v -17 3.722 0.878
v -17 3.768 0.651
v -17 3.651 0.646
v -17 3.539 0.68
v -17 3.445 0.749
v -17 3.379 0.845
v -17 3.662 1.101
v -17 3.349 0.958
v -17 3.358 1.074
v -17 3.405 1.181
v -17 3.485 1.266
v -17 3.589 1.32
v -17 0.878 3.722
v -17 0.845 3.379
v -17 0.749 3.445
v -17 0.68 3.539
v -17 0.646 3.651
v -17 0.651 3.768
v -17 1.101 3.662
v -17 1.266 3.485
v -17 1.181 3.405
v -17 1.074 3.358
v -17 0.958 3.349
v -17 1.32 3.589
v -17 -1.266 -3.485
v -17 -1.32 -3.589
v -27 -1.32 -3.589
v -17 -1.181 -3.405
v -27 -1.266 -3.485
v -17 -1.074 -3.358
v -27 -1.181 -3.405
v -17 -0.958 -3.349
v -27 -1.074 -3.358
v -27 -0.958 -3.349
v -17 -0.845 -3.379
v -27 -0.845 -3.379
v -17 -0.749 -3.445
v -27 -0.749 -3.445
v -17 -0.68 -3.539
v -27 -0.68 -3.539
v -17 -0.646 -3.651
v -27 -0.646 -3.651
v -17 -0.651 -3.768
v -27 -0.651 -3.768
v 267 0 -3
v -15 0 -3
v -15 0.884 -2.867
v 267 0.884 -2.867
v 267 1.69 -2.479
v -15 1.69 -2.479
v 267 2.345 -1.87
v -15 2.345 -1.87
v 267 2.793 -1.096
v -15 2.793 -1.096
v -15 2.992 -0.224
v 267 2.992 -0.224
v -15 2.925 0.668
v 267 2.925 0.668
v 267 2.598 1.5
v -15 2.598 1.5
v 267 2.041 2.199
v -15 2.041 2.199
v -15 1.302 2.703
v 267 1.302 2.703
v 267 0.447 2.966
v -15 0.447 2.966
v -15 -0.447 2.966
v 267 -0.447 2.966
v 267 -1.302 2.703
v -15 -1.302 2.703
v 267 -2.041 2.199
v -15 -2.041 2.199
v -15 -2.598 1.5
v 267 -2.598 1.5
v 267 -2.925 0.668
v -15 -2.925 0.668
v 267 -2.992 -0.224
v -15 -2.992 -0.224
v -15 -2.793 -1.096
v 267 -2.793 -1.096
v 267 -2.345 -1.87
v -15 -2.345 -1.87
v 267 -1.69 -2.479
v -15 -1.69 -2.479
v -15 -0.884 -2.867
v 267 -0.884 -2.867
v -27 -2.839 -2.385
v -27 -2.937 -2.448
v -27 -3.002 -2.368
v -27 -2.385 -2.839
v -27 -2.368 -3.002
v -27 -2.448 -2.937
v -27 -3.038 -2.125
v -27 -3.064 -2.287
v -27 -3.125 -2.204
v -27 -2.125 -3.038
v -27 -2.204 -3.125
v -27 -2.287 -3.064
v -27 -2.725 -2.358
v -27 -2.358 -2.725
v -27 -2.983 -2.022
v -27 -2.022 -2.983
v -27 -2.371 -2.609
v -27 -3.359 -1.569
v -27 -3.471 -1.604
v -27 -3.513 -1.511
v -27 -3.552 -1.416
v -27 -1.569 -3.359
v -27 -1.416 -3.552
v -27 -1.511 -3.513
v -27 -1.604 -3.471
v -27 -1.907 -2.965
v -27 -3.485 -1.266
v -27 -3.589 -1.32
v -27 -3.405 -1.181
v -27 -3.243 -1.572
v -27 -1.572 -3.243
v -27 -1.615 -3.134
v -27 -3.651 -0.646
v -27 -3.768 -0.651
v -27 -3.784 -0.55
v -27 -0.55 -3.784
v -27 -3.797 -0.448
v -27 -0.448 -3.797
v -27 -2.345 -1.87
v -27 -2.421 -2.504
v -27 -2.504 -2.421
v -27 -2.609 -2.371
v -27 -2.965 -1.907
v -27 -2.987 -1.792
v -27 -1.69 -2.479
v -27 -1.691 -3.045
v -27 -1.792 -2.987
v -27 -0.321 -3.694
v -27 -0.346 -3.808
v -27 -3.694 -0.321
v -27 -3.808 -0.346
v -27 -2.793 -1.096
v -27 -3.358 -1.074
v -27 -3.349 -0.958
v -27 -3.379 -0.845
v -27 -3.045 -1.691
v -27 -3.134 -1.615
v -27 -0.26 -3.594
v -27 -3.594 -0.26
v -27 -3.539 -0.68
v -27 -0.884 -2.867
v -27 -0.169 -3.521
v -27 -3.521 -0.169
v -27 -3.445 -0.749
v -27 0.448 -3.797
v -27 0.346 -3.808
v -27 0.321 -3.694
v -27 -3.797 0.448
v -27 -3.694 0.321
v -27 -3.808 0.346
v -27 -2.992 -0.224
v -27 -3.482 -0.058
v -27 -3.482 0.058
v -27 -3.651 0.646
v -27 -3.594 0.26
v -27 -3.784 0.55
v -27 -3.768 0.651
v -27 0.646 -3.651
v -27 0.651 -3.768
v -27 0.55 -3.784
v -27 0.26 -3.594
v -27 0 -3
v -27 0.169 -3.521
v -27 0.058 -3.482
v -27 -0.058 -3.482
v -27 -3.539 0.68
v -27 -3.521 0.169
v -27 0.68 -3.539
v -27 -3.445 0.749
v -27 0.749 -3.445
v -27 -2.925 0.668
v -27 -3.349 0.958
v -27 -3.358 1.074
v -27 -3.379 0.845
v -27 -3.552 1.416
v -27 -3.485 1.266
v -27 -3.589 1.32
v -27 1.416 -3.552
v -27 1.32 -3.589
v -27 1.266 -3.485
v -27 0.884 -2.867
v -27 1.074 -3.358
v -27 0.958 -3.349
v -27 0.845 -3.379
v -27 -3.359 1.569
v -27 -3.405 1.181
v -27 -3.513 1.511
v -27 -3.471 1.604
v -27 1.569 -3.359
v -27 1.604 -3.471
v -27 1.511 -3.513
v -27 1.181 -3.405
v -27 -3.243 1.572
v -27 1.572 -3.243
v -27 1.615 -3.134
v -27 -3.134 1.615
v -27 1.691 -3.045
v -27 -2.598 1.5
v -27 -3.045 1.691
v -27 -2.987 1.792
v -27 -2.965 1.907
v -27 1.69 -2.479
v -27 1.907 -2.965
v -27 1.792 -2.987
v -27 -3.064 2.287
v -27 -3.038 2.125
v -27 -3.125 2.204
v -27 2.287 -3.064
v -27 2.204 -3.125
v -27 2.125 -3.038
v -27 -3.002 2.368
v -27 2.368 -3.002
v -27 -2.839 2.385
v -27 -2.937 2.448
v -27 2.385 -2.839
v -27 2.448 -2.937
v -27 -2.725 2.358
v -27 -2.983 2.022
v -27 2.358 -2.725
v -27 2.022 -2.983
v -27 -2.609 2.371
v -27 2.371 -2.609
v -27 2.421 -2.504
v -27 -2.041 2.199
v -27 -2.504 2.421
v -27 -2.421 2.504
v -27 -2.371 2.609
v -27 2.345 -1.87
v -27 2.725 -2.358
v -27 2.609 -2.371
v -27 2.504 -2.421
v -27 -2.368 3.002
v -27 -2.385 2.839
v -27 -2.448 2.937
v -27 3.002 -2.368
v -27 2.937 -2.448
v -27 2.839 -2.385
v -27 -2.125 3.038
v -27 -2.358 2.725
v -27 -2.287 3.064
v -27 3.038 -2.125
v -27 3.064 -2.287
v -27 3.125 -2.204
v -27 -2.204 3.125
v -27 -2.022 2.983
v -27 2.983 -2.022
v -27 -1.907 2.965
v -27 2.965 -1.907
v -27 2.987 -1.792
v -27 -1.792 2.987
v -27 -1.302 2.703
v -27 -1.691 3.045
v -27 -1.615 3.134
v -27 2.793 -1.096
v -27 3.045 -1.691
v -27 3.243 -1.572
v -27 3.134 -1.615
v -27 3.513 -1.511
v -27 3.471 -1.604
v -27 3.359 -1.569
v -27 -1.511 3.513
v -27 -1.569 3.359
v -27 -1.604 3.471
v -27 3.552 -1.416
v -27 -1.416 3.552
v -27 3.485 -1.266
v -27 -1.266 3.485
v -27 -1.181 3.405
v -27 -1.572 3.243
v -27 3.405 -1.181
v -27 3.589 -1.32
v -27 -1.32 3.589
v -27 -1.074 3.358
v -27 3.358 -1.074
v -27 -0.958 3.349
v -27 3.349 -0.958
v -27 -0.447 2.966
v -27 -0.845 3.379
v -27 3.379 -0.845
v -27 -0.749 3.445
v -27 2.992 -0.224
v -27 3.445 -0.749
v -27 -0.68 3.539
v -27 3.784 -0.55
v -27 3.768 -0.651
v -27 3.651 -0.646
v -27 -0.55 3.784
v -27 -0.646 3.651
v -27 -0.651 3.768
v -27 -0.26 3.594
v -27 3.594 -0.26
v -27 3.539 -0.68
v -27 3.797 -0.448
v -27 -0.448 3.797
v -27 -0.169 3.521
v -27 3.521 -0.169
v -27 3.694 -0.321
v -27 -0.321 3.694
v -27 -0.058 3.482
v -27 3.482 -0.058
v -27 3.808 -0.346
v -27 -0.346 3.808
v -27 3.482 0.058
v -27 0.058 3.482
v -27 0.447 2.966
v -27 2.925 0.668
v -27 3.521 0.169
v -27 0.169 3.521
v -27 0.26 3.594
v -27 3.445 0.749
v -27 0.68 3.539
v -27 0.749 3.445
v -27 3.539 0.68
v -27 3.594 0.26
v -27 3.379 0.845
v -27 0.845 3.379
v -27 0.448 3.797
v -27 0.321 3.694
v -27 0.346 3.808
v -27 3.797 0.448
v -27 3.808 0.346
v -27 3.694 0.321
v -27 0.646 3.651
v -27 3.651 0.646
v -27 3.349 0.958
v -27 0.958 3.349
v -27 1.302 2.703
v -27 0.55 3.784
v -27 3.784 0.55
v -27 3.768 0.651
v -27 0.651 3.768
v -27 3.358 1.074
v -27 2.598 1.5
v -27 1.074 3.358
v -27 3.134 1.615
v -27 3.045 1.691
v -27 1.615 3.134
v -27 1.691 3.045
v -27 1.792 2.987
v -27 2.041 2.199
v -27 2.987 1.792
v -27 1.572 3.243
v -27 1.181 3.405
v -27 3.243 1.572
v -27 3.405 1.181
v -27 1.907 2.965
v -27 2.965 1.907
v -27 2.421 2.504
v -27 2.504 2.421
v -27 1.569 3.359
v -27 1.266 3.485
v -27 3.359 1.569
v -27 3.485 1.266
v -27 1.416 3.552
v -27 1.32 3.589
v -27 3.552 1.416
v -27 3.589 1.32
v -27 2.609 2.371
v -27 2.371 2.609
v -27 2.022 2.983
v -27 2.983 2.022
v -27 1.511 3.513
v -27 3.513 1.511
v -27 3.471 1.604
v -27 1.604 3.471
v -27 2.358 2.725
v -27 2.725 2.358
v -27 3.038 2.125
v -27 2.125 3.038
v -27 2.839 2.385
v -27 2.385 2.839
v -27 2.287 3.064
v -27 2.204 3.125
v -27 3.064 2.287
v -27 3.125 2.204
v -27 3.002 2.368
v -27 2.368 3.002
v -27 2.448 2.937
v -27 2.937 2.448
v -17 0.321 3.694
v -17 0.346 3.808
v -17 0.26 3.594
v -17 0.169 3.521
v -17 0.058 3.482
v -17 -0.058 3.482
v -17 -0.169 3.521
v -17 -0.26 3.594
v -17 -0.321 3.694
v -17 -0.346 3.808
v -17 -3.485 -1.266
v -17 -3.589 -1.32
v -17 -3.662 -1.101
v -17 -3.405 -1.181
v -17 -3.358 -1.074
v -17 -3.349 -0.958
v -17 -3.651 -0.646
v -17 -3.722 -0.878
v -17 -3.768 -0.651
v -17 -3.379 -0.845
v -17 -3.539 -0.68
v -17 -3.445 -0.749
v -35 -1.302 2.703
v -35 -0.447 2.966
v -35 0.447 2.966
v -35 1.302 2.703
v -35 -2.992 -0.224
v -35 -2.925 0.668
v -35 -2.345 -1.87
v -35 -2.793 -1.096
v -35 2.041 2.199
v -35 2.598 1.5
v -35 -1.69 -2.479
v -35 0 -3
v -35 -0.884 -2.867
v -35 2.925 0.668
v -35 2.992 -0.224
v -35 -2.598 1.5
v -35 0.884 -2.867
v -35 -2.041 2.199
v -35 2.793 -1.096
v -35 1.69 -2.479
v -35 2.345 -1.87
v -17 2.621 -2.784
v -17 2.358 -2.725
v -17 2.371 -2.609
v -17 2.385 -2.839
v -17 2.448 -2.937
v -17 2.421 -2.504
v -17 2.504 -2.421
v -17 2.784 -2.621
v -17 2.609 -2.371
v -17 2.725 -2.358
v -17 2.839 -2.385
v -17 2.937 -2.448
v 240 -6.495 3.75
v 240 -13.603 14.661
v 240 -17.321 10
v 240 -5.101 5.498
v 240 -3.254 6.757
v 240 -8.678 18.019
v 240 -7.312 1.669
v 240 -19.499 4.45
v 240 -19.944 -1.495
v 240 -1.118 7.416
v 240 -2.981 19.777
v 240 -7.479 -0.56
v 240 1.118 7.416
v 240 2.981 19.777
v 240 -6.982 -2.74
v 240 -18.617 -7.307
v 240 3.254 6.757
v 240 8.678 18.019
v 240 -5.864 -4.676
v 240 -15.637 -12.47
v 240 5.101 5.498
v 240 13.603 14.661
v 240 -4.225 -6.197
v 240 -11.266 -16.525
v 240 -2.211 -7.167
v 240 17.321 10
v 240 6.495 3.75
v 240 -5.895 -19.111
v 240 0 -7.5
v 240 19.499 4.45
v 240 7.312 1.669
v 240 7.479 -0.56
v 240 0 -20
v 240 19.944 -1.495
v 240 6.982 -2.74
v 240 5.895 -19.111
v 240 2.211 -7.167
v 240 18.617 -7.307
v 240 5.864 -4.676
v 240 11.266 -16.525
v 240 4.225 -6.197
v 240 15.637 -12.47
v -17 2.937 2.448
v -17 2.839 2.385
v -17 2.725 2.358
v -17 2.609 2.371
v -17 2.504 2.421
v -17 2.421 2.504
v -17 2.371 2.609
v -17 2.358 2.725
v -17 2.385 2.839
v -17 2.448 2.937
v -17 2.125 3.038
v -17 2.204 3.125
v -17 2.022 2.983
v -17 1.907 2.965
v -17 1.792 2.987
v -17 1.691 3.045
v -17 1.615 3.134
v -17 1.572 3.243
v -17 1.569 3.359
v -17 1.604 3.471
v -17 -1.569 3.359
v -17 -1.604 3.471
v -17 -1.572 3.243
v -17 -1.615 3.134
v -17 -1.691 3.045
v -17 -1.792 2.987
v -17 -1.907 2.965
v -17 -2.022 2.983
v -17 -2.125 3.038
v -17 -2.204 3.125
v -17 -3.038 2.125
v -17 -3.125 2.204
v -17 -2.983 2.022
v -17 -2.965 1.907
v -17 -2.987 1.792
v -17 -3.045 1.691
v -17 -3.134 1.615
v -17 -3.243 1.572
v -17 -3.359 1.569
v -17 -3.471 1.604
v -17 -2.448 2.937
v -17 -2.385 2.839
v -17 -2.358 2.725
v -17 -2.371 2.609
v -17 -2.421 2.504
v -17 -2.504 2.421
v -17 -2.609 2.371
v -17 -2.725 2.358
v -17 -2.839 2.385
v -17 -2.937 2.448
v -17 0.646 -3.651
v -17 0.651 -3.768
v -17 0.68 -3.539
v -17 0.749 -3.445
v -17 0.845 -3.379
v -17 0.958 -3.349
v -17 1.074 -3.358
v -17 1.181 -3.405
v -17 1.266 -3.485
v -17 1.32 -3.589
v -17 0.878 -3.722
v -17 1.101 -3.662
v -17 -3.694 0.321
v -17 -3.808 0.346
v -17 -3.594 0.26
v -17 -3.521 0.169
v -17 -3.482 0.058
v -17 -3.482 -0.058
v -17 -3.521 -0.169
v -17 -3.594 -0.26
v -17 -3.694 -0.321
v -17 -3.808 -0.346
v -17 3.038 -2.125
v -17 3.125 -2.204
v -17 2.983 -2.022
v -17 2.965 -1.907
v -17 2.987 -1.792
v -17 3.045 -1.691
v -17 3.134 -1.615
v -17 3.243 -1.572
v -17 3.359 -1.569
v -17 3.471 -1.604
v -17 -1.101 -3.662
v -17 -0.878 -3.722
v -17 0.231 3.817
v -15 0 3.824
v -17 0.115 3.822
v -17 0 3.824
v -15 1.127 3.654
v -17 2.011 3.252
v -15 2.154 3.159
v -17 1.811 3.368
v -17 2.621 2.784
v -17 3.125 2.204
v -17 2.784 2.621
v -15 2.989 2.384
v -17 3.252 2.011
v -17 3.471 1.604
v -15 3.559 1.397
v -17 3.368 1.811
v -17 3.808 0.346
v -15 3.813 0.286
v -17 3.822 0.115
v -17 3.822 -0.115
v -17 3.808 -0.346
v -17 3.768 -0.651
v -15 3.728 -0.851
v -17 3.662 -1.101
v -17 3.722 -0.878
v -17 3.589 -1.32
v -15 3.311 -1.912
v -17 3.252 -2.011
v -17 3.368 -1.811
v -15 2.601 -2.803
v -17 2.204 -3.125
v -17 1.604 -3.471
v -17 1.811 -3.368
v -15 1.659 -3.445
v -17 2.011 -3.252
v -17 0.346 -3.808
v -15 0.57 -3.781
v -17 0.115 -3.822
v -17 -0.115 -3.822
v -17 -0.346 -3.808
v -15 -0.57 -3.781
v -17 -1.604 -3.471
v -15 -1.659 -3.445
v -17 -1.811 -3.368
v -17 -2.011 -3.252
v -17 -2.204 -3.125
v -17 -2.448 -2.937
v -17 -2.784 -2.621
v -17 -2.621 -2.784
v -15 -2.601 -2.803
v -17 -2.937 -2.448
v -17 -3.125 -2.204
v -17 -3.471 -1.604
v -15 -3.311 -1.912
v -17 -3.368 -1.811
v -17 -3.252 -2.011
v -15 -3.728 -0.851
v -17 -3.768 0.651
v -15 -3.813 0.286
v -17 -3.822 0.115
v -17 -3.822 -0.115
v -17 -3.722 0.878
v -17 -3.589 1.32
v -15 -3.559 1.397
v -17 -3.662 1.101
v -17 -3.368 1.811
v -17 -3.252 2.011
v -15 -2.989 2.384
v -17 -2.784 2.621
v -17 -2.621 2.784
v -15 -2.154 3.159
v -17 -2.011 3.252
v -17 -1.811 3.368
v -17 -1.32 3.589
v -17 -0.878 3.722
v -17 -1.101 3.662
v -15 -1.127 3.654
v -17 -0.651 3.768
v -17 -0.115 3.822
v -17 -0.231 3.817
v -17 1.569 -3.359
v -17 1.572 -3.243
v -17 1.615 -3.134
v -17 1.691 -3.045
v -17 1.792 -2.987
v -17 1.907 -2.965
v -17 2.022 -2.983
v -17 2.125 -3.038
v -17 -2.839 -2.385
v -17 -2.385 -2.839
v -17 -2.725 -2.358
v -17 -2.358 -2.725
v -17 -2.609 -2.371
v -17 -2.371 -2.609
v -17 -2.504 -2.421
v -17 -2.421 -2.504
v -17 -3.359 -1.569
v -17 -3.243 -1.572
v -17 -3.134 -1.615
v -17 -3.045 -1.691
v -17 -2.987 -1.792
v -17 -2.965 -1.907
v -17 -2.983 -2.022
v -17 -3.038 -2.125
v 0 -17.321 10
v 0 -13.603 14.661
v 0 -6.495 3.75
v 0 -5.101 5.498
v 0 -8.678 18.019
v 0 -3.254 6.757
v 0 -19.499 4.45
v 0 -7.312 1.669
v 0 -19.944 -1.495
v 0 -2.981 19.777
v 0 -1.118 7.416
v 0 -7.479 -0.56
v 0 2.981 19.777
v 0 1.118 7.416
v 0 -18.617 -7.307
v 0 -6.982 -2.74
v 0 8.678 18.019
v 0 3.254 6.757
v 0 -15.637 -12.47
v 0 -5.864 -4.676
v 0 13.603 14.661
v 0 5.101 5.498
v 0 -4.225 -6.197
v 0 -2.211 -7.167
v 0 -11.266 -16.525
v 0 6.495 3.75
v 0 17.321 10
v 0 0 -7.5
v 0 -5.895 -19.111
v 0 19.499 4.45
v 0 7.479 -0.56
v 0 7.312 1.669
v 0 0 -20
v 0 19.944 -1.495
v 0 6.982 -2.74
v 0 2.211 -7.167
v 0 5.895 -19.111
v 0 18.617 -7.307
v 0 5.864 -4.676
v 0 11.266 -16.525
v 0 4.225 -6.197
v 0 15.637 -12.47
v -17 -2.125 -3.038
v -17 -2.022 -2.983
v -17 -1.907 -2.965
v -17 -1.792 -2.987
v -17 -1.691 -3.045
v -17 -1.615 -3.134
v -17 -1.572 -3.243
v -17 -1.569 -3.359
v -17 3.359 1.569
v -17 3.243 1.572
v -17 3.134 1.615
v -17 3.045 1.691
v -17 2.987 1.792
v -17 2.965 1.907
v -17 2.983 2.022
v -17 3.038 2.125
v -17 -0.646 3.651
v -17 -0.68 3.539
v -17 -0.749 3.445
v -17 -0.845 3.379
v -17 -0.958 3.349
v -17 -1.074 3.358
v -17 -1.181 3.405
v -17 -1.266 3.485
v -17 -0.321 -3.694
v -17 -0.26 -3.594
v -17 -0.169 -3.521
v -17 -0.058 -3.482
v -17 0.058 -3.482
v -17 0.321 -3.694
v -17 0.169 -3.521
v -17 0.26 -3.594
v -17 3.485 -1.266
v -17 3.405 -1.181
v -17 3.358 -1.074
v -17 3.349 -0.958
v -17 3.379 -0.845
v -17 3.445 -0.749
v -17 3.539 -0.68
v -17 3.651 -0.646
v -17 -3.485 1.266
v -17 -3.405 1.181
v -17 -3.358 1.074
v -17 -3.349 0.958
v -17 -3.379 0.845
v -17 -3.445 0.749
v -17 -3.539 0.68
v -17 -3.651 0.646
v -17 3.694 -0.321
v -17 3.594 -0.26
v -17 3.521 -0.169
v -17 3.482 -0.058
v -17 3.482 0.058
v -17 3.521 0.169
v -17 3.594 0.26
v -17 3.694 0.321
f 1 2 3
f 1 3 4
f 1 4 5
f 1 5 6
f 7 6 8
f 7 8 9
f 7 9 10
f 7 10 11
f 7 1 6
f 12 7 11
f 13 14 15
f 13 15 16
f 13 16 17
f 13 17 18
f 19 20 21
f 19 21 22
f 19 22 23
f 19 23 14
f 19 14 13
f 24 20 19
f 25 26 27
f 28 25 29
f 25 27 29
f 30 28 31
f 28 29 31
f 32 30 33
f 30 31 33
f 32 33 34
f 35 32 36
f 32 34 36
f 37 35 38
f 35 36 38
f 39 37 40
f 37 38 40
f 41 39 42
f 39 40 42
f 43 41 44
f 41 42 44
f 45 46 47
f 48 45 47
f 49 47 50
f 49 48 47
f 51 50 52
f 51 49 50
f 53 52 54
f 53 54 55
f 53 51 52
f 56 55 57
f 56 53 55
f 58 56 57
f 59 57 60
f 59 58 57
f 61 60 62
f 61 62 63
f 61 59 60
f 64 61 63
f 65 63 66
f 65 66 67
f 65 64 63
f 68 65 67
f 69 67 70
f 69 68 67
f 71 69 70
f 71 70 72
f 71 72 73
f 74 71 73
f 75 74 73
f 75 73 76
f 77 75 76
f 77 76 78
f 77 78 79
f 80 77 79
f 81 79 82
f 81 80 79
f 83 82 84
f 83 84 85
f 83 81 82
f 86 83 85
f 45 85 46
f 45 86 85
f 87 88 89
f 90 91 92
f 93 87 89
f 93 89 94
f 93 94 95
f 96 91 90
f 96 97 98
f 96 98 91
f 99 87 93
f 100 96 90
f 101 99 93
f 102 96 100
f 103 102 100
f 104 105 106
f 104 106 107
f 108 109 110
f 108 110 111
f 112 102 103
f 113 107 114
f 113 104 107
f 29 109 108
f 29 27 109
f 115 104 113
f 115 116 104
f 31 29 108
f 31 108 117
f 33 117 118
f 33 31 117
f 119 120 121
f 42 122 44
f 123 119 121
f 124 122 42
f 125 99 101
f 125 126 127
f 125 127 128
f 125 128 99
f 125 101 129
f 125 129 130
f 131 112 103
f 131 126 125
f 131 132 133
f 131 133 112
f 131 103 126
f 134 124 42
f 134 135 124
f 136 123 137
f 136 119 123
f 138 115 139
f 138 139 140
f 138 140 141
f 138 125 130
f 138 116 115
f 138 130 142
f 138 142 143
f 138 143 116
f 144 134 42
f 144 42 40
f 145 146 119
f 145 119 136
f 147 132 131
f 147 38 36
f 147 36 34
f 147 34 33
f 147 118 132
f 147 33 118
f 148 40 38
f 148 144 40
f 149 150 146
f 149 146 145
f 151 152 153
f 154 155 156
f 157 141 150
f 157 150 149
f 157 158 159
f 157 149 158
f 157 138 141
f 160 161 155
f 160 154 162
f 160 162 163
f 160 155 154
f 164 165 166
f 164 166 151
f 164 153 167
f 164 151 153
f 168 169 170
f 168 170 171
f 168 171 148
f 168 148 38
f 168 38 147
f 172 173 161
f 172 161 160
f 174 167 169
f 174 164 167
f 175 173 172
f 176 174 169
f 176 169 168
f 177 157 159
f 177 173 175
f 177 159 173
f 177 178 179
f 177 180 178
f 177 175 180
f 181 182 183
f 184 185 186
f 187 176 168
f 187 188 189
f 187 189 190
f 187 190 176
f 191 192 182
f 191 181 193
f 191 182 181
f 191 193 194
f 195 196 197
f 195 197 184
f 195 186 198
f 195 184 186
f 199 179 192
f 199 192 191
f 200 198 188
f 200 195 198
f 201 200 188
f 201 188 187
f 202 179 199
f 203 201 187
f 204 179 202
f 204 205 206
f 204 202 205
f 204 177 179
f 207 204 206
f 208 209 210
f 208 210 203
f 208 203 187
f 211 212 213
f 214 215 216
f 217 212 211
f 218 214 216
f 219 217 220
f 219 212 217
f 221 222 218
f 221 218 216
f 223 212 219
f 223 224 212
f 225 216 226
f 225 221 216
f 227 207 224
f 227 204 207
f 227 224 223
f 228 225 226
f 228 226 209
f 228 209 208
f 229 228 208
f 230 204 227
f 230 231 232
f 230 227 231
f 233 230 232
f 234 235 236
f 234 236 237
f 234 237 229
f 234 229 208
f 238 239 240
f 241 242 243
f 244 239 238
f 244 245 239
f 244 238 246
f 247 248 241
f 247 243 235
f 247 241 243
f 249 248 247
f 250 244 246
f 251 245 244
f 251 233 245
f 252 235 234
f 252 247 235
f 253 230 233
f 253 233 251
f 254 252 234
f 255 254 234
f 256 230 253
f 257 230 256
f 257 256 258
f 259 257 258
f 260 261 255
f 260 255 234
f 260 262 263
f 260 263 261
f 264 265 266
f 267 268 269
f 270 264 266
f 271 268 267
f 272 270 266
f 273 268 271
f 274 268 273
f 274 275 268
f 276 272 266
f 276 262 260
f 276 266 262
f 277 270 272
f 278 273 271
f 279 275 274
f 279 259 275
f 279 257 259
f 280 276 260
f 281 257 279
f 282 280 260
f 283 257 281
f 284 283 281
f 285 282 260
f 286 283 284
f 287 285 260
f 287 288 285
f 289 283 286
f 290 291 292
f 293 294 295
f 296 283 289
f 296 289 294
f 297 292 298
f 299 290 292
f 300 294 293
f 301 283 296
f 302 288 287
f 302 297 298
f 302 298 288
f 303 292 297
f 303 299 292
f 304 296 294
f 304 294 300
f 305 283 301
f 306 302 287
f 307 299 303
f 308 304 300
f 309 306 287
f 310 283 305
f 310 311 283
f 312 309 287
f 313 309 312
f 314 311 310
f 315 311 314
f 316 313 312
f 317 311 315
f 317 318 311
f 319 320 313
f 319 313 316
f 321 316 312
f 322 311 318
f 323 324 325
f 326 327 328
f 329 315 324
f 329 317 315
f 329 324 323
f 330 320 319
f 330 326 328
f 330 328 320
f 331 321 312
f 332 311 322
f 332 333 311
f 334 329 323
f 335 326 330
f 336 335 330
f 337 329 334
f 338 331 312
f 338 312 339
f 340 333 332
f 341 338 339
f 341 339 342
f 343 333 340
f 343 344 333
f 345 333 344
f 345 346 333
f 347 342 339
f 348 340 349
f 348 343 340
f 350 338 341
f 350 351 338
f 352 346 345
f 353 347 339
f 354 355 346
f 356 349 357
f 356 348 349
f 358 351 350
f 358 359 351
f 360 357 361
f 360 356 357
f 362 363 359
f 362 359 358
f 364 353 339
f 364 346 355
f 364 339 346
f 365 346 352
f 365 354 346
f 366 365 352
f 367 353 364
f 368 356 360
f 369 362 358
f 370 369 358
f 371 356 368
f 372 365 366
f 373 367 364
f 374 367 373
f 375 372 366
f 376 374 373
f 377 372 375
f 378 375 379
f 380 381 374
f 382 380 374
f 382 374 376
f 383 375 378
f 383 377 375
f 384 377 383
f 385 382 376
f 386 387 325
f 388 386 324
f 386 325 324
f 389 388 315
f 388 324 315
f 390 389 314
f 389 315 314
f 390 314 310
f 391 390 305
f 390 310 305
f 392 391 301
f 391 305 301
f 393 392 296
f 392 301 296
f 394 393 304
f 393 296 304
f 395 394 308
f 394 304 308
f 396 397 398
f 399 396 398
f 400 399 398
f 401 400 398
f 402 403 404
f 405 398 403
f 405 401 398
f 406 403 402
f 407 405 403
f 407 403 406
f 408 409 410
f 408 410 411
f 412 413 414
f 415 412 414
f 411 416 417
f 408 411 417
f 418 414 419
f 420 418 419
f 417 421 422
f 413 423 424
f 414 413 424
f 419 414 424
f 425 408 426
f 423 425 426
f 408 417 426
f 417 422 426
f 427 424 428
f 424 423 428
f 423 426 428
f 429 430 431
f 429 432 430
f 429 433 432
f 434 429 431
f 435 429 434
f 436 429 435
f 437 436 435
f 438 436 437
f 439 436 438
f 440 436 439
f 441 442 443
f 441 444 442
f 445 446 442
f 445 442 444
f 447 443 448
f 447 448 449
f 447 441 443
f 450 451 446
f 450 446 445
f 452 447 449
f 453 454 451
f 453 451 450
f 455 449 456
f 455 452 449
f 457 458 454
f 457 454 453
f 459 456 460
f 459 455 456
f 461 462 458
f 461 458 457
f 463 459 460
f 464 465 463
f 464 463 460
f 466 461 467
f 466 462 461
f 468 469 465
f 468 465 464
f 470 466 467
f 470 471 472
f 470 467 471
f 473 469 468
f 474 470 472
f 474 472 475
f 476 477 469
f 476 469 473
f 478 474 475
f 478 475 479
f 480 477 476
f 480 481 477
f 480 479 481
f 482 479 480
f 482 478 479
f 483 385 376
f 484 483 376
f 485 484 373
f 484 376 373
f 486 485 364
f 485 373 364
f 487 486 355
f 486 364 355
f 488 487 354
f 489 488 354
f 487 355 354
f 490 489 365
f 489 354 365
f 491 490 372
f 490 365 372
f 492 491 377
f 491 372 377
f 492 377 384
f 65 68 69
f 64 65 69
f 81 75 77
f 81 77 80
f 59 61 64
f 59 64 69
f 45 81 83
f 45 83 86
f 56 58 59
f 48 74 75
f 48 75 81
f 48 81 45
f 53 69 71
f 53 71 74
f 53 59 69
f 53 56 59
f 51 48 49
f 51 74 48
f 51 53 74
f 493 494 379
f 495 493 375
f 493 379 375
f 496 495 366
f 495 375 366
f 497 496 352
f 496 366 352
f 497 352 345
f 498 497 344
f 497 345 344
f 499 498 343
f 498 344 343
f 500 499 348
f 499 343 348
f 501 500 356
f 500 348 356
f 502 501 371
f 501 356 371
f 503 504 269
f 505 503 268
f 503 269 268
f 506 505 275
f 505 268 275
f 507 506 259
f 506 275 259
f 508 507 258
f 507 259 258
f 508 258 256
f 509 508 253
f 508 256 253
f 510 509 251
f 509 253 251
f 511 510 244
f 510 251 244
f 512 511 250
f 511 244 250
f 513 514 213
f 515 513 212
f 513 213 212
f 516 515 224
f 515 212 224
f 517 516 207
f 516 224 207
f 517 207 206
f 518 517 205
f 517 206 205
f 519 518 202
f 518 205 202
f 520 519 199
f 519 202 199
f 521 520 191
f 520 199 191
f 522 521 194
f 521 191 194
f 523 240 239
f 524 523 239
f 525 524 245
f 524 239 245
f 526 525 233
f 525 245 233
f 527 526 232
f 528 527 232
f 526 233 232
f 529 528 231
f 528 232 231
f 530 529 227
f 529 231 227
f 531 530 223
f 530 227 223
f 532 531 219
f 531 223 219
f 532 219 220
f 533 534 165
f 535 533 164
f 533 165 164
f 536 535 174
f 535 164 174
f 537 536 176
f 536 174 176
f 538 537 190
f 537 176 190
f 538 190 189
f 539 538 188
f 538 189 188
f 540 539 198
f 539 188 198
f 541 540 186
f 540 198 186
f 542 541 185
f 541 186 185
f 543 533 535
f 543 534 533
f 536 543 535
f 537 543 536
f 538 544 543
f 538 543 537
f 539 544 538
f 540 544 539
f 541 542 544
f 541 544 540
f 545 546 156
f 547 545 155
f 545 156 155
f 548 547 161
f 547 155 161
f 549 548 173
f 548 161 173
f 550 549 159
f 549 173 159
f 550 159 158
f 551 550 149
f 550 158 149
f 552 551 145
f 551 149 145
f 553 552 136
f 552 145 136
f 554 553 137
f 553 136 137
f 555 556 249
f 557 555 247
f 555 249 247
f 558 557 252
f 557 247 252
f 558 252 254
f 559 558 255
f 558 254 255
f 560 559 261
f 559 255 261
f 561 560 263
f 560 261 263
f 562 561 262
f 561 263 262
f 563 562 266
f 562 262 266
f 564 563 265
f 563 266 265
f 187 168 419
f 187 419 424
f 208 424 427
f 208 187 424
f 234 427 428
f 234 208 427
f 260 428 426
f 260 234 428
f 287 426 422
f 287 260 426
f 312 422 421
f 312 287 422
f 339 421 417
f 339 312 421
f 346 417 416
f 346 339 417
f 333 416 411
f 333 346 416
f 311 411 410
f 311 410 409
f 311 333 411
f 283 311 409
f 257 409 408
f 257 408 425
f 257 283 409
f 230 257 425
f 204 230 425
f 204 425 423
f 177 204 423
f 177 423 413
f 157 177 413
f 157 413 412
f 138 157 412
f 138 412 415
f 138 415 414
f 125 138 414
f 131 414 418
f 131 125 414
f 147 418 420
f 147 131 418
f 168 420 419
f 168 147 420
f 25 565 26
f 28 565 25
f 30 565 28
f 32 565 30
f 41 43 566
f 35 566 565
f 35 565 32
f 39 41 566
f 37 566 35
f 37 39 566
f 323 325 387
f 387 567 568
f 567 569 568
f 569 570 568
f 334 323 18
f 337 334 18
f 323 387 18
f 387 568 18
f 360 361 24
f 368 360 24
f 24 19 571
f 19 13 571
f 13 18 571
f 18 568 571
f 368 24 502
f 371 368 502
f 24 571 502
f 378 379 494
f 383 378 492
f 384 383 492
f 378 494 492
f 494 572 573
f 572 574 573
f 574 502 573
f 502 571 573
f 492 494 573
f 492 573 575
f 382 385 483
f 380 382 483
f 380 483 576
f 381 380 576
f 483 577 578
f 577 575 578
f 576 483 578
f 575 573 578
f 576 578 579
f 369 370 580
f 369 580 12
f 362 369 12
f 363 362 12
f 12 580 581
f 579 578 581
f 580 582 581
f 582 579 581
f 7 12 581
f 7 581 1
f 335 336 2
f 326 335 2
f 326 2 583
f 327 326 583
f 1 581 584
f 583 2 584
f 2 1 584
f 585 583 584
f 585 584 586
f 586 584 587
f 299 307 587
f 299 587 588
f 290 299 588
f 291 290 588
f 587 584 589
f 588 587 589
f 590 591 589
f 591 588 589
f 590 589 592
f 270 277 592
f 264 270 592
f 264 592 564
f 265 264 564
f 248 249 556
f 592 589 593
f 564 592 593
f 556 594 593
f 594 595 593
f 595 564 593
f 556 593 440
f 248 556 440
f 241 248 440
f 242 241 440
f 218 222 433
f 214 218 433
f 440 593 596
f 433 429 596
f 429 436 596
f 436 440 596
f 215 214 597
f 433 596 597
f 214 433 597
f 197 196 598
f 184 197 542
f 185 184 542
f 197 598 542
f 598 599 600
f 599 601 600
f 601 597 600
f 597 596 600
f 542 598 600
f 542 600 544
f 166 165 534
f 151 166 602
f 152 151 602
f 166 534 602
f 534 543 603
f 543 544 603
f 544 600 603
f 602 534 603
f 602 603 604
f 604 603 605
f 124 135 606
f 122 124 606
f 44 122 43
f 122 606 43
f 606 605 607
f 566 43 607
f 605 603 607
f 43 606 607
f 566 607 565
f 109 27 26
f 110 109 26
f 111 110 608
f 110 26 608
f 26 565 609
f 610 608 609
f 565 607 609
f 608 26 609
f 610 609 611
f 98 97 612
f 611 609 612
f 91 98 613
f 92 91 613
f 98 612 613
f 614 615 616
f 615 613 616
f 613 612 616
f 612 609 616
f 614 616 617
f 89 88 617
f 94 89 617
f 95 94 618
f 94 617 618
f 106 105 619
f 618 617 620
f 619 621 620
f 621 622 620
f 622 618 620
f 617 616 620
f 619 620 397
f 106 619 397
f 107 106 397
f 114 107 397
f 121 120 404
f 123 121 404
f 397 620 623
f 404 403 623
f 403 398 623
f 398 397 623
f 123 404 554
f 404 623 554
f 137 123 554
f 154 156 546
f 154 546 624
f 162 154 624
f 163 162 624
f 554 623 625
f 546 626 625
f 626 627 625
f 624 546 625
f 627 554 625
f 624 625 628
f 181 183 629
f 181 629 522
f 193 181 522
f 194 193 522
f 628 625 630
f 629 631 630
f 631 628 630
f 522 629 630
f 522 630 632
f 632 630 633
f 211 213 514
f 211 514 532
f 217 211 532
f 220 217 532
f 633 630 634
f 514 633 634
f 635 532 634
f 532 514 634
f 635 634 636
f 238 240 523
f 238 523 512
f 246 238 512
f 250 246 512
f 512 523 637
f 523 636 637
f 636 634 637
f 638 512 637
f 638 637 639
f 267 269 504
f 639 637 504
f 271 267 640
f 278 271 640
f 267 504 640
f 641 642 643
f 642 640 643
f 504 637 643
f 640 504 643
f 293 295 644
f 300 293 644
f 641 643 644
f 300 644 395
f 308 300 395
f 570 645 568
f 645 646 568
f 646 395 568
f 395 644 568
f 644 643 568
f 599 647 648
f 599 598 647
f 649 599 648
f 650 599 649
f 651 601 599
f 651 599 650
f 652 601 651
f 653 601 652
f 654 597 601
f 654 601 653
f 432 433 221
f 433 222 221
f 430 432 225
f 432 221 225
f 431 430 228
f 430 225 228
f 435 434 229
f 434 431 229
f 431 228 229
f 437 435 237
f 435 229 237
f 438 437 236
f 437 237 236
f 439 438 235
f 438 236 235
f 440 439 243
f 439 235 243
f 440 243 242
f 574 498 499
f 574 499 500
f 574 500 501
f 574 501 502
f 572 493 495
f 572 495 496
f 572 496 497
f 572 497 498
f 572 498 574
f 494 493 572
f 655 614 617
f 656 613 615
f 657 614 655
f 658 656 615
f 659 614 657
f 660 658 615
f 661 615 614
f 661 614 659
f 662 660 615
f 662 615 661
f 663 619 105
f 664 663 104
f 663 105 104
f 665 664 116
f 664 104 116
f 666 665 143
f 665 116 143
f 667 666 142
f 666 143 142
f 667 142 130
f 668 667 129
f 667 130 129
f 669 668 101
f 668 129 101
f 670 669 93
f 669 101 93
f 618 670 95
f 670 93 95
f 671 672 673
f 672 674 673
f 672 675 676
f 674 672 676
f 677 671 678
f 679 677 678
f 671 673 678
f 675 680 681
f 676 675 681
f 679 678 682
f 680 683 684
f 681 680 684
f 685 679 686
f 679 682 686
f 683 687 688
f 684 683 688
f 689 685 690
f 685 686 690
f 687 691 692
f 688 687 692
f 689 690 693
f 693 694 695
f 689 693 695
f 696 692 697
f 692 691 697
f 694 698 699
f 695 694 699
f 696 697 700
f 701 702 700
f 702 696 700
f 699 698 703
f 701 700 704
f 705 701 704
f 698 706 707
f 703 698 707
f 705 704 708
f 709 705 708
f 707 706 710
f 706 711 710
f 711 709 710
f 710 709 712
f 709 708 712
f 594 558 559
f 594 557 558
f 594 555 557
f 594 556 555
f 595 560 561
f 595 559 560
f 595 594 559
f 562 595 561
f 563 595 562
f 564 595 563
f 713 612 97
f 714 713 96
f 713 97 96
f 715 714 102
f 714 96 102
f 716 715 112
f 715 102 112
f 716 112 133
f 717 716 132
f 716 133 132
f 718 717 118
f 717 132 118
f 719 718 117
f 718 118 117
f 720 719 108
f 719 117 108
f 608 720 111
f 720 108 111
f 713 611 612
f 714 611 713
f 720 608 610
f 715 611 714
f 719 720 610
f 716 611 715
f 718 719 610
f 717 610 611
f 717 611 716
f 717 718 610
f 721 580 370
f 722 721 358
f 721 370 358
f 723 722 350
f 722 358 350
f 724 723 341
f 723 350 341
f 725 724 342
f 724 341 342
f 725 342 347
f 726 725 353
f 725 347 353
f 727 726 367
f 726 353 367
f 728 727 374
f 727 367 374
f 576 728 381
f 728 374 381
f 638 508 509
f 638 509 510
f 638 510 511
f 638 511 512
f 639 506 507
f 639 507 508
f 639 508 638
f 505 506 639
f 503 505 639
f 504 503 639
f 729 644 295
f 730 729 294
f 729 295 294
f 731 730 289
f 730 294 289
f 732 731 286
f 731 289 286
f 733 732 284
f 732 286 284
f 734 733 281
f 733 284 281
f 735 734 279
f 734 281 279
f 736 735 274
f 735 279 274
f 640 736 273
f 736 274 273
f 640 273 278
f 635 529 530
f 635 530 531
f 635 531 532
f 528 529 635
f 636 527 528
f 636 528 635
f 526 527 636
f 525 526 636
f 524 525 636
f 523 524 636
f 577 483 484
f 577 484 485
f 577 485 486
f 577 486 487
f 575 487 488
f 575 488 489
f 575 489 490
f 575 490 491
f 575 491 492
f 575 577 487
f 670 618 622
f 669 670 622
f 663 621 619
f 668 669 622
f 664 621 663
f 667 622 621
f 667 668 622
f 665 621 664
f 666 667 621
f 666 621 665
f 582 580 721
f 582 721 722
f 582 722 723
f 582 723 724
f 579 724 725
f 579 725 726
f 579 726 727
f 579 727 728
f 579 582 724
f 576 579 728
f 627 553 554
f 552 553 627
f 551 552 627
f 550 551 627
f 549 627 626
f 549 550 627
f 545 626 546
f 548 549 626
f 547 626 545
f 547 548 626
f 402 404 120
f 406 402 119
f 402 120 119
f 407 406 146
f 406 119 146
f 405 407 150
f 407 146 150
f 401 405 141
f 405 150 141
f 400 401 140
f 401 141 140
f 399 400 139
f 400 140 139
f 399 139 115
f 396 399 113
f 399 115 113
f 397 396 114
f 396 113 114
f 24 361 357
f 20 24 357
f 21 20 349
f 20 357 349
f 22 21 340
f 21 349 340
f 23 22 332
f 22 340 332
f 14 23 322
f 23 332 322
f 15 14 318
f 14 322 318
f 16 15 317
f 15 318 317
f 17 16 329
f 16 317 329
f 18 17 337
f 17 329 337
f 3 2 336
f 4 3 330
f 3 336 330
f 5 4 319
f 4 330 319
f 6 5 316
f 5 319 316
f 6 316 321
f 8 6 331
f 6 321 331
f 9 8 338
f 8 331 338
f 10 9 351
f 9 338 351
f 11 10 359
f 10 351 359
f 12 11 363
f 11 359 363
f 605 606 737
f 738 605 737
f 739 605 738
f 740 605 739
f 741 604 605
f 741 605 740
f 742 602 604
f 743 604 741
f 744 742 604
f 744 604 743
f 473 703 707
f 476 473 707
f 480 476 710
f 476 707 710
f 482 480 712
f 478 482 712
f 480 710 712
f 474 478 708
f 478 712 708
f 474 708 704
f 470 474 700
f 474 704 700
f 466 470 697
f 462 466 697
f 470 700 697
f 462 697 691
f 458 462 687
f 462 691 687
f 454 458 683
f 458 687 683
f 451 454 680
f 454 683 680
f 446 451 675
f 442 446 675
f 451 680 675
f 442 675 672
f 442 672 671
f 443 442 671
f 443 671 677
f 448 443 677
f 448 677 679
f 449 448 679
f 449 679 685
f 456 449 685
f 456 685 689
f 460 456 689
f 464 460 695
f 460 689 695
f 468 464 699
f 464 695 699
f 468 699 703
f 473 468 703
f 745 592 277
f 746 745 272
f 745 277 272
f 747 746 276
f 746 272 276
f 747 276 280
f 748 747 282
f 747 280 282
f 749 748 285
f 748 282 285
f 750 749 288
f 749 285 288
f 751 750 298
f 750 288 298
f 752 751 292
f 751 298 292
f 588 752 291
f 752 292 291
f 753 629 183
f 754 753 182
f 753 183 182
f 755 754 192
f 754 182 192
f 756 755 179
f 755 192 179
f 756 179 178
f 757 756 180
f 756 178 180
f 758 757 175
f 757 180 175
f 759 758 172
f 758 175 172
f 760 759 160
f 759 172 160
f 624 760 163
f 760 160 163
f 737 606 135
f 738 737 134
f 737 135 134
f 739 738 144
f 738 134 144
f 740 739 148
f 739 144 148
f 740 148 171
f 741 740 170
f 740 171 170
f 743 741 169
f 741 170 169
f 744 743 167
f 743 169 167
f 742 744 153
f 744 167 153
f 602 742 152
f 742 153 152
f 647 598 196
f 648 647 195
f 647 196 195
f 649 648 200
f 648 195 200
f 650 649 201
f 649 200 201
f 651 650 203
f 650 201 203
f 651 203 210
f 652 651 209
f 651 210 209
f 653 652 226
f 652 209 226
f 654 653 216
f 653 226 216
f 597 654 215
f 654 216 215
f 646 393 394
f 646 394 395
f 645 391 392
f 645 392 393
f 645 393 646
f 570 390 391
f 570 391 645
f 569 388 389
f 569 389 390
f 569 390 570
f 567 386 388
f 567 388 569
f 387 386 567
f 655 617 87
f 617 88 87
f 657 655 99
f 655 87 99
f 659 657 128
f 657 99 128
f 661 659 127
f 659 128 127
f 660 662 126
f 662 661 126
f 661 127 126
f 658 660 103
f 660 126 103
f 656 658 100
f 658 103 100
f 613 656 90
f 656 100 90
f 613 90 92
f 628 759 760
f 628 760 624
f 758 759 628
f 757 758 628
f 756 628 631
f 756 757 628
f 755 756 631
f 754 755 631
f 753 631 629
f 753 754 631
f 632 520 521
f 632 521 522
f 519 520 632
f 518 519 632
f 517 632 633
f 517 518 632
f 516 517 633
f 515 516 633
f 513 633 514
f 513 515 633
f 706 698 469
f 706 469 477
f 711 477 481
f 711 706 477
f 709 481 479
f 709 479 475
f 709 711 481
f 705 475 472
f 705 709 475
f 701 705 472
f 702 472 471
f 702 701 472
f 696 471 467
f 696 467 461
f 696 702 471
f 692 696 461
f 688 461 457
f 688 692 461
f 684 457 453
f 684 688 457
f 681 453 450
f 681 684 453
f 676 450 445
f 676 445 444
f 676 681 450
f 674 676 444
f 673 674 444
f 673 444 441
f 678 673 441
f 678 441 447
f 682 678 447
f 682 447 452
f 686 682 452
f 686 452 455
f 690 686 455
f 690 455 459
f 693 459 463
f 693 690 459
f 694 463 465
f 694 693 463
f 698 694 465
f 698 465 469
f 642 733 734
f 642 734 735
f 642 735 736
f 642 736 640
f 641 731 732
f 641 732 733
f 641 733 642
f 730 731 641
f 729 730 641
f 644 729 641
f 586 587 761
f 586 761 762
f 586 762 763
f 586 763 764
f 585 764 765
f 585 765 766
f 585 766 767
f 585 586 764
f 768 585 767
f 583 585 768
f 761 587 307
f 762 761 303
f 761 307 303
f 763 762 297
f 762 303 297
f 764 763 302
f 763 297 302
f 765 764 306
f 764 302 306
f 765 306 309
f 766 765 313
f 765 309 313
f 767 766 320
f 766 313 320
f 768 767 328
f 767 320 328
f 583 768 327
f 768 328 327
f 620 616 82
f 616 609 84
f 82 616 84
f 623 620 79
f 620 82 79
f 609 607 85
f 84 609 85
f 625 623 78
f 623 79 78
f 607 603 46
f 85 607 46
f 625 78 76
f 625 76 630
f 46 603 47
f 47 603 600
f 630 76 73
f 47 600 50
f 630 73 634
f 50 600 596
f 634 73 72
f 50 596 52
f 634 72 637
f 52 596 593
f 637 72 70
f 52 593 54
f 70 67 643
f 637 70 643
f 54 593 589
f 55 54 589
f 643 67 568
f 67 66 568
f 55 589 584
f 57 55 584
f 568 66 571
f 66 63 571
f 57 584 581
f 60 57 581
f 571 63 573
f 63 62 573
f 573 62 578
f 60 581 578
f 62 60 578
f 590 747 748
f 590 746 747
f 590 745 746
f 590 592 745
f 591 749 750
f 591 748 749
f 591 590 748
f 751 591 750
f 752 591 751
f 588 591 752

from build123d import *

# Parameters (mm, degrees)
SKETCH1_R                = 20
SKETCH1_R_2              = 7.5
BOSS_EXTRUDE1_DEPTH      = 240
SKETCH6_R                = 3
BOSS_EXTRUDE2_DEPTH      = 27
BOSS_EXTRUDE2_DEPTH_BACK = 275
SKETCH7_R                = 3.823623307
BOSS_EXTRUDE3_DEPTH      = 12
SKETCH8_R                = 0.346261595
CUT_EXTRUDE1_DEPTH       = 10


with BuildPart() as part:
    # Sketch1 → Boss-Extrude1 (new body)
    with BuildSketch(Plane(origin=(0, 0, 0), x_dir=(0, 0, -1), z_dir=(1, 0, 0))):
        Circle(SKETCH1_R)
        Circle(SKETCH1_R_2, mode=Mode.SUBTRACT)
    extrude(amount=BOSS_EXTRUDE1_DEPTH)


with BuildPart() as body_2:
    # Sketch6 → Boss-Extrude2 (new body, two sides)
    with BuildSketch(Plane(origin=(240, 0, 0), x_dir=(0, 0, -1), z_dir=(1, 0, 0))) as boss_extrude2_sk:
        Circle(SKETCH6_R)
    extrude(amount=BOSS_EXTRUDE2_DEPTH)
    extrude(boss_extrude2_sk.sketch, amount=-BOSS_EXTRUDE2_DEPTH_BACK)

    # Sketch7 → Boss-Extrude3 (add)
    with BuildSketch(Plane.ZY.offset(15)):
        Circle(SKETCH7_R)
    extrude(amount=BOSS_EXTRUDE3_DEPTH)

    # Sketch8 → Cut-Extrude1 (cut)
    with BuildSketch(Plane.ZY.offset(27)):
        with Locations((-3.823623307, 0)):
            Circle(SKETCH8_R)
        with Locations((-3.693336502, 0.989626533)):
            Circle(SKETCH8_R)
        with Locations((-3.311354918, 1.911811653)):
            Circle(SKETCH8_R)
        with Locations((-2.703709969, 2.703709969)):
            Circle(SKETCH8_R)
        with Locations((-1.911811653, 3.311354918)):
            Circle(SKETCH8_R)
        with Locations((-0.989626533, 3.693336502)):
            Circle(SKETCH8_R)
        with Locations((0, 3.823623307)):
            Circle(SKETCH8_R)
        with Locations((0.989626533, 3.693336502)):
            Circle(SKETCH8_R)
        with Locations((1.911811653, 3.311354918)):
            Circle(SKETCH8_R)
        with Locations((2.703709969, 2.703709969)):
            Circle(SKETCH8_R)
        with Locations((3.311354918, 1.911811653)):
            Circle(SKETCH8_R)
        with Locations((3.693336502, 0.989626533)):
            Circle(SKETCH8_R)
        with Locations((3.823623307, 0)):
            Circle(SKETCH8_R)
        with Locations((3.693336502, -0.989626533)):
            Circle(SKETCH8_R)
        with Locations((3.311354918, -1.911811653)):
            Circle(SKETCH8_R)
        with Locations((2.703709969, -2.703709969)):
            Circle(SKETCH8_R)
        with Locations((1.911811653, -3.311354918)):
            Circle(SKETCH8_R)
        with Locations((0.989626533, -3.693336502)):
            Circle(SKETCH8_R)
        with Locations((0, -3.823623307)):
            Circle(SKETCH8_R)
        with Locations((-0.989626533, -3.693336502)):
            Circle(SKETCH8_R)
        with Locations((-1.911811653, -3.311354918)):
            Circle(SKETCH8_R)
        with Locations((-2.703709969, -2.703709969)):
            Circle(SKETCH8_R)
        with Locations((-3.311354918, -1.911811653)):
            Circle(SKETCH8_R)
        with Locations((-3.693336502, -0.989626533)):
            Circle(SKETCH8_R)
    extrude(amount=-CUT_EXTRUDE1_DEPTH, mode=Mode.SUBTRACT)


solid = Compound([part.part, body_2.part])
